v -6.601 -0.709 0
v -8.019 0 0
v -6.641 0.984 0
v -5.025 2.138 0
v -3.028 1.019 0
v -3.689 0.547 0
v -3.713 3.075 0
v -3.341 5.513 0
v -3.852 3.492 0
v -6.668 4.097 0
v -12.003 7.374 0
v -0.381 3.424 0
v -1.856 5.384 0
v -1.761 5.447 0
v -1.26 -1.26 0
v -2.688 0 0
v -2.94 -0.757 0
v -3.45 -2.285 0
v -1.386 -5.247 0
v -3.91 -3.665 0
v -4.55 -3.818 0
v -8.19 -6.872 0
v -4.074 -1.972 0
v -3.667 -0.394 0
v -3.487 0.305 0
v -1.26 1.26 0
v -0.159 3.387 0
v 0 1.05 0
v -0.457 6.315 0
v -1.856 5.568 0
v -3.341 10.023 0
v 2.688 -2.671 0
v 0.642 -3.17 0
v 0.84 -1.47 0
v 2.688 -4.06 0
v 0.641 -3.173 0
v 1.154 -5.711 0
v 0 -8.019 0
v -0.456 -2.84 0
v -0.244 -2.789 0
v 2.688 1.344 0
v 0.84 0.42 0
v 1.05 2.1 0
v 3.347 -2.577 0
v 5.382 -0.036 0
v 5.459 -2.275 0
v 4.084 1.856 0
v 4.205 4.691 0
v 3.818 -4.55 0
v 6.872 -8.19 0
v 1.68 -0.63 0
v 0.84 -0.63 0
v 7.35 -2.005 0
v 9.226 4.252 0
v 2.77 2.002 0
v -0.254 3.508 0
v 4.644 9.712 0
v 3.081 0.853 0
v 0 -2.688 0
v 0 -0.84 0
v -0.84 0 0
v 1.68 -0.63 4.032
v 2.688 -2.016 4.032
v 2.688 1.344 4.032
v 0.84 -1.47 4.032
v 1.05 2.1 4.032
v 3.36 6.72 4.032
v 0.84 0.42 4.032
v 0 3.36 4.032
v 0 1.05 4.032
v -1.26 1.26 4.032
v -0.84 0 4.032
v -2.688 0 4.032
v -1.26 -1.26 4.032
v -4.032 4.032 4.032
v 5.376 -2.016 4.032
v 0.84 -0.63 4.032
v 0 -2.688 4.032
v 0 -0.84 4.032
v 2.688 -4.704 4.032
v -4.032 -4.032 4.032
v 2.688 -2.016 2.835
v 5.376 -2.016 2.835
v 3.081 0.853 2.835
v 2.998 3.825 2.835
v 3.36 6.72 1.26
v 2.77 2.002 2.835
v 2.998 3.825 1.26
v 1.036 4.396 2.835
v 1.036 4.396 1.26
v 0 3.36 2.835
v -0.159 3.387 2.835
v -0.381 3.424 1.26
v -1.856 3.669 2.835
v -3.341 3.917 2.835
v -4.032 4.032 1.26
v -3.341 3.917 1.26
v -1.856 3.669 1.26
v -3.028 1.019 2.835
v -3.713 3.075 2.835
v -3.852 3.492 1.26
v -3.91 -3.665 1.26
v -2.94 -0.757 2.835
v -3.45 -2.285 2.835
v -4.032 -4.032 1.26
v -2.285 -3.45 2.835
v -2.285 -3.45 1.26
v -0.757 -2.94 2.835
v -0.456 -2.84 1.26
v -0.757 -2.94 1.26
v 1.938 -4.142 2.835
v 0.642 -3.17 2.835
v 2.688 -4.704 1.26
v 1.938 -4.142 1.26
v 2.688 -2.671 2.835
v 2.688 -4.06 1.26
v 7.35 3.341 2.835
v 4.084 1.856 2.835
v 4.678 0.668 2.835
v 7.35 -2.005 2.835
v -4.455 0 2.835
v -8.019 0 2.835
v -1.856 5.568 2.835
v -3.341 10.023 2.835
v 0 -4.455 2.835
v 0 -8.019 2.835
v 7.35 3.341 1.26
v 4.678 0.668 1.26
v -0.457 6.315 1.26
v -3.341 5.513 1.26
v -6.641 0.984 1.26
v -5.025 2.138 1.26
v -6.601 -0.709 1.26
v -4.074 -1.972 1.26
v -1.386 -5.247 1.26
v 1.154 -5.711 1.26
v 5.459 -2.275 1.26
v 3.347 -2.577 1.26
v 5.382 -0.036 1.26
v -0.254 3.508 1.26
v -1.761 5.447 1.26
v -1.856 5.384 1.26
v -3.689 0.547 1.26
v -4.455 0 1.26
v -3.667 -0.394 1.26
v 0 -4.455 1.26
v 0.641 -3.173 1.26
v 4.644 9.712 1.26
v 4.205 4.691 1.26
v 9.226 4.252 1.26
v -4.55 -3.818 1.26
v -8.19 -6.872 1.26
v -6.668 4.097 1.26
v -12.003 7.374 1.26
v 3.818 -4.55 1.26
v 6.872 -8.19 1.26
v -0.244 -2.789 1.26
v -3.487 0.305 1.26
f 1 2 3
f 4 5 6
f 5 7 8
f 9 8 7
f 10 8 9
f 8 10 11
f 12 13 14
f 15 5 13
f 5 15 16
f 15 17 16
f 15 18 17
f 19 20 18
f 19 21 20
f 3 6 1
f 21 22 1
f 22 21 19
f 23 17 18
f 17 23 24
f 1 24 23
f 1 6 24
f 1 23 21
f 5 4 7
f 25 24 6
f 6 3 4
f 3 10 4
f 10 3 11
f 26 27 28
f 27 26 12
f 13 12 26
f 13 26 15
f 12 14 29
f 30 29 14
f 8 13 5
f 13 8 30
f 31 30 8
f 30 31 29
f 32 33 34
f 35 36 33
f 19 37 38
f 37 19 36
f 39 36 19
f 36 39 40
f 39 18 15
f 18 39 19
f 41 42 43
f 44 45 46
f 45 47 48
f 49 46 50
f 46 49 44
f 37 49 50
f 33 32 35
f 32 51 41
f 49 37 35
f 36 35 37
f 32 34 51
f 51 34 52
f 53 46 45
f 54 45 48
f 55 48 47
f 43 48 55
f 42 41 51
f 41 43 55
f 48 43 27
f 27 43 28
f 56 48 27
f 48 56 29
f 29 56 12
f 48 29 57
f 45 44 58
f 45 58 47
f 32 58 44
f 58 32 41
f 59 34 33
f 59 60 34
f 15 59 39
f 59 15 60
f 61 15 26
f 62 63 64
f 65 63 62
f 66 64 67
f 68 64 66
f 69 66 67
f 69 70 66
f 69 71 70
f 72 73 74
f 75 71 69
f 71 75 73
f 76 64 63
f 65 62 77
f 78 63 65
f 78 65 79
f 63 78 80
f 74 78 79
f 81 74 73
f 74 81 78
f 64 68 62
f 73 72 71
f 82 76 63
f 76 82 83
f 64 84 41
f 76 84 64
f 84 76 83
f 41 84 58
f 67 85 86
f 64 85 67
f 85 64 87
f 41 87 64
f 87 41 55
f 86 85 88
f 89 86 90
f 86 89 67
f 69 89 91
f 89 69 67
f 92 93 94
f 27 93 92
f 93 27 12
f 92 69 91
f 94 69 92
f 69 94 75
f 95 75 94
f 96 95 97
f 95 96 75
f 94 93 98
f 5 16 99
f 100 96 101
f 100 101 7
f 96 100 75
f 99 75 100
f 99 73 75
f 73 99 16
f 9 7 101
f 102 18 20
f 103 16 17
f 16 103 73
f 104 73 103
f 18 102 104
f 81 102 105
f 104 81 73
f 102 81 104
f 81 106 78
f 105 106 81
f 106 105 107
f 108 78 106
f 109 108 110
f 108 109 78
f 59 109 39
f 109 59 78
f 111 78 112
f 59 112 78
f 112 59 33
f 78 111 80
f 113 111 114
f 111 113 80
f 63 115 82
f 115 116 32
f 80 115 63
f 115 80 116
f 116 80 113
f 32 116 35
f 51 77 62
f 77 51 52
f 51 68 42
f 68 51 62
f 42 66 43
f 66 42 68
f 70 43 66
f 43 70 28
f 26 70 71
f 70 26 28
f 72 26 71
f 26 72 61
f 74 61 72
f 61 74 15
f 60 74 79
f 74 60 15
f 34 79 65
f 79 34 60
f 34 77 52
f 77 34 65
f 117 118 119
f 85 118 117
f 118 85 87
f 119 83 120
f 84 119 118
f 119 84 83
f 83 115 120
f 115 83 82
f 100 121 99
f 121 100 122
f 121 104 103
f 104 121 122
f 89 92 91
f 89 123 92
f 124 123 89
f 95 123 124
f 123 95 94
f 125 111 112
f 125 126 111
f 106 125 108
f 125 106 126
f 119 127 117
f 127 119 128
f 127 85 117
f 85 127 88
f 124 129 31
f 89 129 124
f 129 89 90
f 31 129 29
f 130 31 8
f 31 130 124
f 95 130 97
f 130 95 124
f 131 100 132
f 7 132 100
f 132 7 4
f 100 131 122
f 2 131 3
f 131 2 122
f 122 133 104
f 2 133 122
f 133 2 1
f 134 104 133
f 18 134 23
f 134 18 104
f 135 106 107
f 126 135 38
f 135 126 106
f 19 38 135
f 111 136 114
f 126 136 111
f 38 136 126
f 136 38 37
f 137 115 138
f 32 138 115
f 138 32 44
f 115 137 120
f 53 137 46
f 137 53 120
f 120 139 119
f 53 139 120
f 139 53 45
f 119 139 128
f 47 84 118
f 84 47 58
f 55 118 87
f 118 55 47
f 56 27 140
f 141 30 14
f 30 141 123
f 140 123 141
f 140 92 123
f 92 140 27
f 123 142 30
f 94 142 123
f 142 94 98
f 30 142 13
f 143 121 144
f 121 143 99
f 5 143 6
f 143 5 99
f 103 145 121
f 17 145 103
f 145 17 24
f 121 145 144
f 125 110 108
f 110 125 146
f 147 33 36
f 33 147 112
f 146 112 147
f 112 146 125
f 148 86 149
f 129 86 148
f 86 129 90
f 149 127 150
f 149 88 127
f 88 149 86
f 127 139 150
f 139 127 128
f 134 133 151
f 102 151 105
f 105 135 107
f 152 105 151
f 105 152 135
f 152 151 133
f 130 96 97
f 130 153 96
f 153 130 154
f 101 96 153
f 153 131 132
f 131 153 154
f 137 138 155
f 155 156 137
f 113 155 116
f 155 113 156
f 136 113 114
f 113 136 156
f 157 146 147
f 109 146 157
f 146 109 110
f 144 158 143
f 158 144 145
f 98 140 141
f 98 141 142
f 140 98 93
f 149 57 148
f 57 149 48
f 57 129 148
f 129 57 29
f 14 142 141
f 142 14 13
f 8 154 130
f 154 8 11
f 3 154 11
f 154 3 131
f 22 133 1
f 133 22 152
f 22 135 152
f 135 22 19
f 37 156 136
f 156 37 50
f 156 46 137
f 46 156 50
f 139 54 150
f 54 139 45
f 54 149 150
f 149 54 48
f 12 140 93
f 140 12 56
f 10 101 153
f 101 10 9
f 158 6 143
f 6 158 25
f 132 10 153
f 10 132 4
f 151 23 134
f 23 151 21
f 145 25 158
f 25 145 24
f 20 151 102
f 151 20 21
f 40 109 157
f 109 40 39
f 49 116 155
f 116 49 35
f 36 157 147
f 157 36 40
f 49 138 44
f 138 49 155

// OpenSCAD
module crit() {

module bang() {
	polygon([
		[4, -1.5],
		[2, 1],
		[2.5, 5],
		[0, 2.5],
		[-3, 3],
		[-2, 0],
		[-3, -3],
		[0, -2],
		[2, -3.5],
		[2, -1.5]
	]);
}

scale(0.7) union() {

	scale(0.6) difference() {
		scale(3.2) linear_extrude(height = 3) bang();
		translate([0, 0, -10]) linear_extrude(height = 20) bang();
	}

	scale(1.5) rotate([0, 0, 45]) difference() {
		scale(1.8) linear_extrude(height = 1.5) bang();
		translate([0, 0, -10]) linear_extrude(height = 20) bang();
	}

	scale(2) rotate([0, 0, 85]) difference() {
		scale(1.8) linear_extrude(height = 0.5) bang();
		translate([0, 0, -10]) linear_extrude(height = 20) bang();
	}

}

}

crit();

// cube([10, 10, 10]);
